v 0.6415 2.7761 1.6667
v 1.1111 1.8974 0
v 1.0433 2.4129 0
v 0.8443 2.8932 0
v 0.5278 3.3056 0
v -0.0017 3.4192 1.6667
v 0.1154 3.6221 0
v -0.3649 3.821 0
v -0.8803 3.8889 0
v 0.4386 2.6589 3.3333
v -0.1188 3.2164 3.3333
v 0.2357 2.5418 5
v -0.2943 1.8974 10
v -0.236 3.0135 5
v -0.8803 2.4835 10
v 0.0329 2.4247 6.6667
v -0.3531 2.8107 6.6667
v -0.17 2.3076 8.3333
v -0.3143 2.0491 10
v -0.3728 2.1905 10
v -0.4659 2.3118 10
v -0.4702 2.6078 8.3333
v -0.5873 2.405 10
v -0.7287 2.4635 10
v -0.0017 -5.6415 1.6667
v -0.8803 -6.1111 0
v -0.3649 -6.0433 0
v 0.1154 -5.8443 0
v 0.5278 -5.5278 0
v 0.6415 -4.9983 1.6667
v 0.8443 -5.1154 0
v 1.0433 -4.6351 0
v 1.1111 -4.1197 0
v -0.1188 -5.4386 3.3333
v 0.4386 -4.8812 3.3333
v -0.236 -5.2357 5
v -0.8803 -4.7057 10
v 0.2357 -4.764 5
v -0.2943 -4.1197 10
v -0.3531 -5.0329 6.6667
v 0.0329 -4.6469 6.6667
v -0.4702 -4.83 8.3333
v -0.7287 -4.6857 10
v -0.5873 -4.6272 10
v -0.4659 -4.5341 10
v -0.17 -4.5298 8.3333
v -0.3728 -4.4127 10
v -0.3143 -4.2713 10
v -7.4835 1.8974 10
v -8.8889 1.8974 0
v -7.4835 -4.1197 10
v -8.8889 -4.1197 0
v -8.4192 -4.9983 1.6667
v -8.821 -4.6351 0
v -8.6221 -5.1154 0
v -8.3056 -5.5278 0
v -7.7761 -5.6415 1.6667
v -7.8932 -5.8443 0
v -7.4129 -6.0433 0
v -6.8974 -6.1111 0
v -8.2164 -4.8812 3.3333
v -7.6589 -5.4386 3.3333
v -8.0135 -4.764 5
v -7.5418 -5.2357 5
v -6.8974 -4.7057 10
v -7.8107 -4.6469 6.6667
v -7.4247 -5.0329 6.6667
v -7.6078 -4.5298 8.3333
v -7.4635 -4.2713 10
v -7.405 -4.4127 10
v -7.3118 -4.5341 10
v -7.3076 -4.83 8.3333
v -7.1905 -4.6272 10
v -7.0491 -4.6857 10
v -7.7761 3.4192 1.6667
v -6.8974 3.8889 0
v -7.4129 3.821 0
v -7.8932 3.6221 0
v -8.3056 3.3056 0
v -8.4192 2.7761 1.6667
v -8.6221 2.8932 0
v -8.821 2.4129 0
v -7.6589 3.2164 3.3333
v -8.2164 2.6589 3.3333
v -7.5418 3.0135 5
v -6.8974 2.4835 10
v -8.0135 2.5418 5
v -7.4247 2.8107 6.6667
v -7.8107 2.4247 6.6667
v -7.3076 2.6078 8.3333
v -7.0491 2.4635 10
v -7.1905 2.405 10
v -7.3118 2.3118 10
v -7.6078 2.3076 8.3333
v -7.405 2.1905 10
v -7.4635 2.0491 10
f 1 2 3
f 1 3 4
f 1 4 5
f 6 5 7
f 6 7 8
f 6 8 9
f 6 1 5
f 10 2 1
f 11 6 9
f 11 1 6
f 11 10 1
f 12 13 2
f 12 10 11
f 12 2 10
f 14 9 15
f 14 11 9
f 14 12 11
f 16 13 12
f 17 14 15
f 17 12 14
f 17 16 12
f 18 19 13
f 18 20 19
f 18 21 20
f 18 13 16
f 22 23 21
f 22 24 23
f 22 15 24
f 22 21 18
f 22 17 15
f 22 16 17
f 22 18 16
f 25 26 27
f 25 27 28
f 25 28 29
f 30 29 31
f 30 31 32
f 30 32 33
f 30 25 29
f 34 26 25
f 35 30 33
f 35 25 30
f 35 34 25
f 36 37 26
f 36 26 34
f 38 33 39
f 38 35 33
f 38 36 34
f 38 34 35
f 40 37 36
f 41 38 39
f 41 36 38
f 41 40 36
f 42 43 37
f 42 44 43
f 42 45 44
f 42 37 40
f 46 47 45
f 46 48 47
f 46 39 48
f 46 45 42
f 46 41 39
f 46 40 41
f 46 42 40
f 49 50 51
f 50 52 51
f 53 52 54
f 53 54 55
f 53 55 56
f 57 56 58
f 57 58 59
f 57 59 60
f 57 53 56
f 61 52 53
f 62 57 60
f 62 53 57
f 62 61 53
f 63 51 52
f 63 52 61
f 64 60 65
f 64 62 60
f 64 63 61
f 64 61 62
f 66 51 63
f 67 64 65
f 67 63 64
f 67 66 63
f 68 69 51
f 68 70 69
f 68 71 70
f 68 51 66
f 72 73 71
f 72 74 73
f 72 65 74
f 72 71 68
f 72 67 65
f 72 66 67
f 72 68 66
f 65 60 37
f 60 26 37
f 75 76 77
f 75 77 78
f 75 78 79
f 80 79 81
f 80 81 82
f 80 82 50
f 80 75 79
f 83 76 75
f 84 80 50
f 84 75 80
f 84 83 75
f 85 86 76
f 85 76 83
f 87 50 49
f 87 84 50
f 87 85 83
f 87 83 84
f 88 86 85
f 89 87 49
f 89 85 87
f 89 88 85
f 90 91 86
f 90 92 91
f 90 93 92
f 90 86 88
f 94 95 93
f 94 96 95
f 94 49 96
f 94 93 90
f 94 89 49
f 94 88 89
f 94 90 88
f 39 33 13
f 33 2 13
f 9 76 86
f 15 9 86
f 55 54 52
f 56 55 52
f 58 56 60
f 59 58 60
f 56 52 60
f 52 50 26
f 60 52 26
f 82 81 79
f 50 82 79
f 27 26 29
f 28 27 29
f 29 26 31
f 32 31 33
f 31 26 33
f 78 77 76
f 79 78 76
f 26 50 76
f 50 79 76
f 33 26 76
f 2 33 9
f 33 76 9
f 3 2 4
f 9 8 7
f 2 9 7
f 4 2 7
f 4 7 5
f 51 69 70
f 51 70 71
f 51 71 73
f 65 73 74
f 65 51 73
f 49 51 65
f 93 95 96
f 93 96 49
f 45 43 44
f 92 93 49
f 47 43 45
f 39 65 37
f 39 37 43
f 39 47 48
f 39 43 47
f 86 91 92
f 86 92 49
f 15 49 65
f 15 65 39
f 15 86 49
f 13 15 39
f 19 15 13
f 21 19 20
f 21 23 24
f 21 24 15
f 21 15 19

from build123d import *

# Parameters (mm, degrees)
BOSS_EXTRUDE1_DEPTH = 10
BOSS_EXTRUDE1_TAPER = 8


with BuildPart() as part:
    # Sketch1 → Boss-Extrude1 (new body)
    with BuildSketch(Plane.XY):
        with BuildLine():
            ThreePointArc((-6.897446528, 3.888888889), (-8.305608926, 3.305608926), (-8.888888889, 1.897446528))
            Line((-8.888888889, 1.897446528), (-8.888888889, -4.11966875))
            ThreePointArc((-8.888888889, -4.11966875), (-8.305608926, -5.527831148), (-6.897446528, -6.111111111))
            Line((-6.897446528, -6.111111111), (-0.88033125, -6.111111111))
            ThreePointArc((-0.88033125, -6.111111111), (0.527831148, -5.527831148), (1.111111111, -4.11966875))
            Line((1.111111111, -4.11966875), (1.111111111, 1.897446528))
            ThreePointArc((1.111111111, 1.897446528), (0.527831148, 3.305608926), (-0.88033125, 3.888888889))
            Line((-0.88033125, 3.888888889), (-6.897446528, 3.888888889))
        make_face()
    extrude(amount=BOSS_EXTRUDE1_DEPTH, taper=BOSS_EXTRUDE1_TAPER)


solid = part.part
